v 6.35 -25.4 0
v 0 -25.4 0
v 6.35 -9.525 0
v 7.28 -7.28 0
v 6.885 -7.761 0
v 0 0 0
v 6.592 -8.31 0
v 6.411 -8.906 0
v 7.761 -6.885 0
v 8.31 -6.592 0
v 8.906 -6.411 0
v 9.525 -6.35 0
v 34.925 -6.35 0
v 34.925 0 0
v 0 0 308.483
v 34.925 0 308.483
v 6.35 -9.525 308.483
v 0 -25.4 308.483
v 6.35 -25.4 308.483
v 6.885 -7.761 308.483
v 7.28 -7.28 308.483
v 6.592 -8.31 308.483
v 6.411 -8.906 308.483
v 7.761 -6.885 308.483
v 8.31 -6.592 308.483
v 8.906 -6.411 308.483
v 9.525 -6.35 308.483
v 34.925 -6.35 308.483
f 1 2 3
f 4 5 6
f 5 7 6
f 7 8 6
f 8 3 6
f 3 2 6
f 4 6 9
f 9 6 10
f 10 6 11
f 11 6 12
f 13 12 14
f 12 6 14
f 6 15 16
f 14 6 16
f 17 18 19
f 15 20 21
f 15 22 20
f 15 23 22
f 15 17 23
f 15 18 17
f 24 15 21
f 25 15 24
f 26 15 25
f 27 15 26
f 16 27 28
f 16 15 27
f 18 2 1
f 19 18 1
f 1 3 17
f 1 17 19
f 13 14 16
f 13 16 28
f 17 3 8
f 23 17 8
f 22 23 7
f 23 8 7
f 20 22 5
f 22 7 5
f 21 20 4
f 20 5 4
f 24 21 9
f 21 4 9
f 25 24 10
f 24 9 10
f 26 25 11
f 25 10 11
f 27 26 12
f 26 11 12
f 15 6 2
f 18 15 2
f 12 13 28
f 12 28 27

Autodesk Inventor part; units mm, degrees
ref_plane "YZ Plane" through (0, 0, 0) normal (1, 0, 0) x (0, 1, 0)
ref_plane "XZ Plane" through (0, 0, 0) normal (0, 1, 0) x (-1, 0, 0)
ref_plane "XY Plane" through (0, 0, 0) normal (0, 0, 1) x (1, 0, 0)
sketch "Sketch1" plane through (0, 0, 0) normal (0, 0, 1) x (1, 0, 0)
  line L0 (0, 0) -> (0, -25.4)
  line L1 (0, 0) -> (34.925, 0)
  line L2 (0, -25.4) -> (6.35, -25.4)
  line L3 (34.925, 0) -> (34.925, -6.35)
  line L4 (34.925, -6.35) -> (9.525, -6.35)
  line L5 (6.35, -9.525) -> (6.35, -25.4)
  arc A0 (9.525, -6.35) -> (6.35, -9.525) centre (9.525, -9.525) ccw
  dimension "d0" = 25.4
  dimension "d1" = 34.925
  dimension "d2" = 6.35
  dimension "d3" = 6.35
  dimension "d4" = 3.175
extrude "Extrusion1" add sketch "Sketch1" along normal blind 308.483
equation "\"d2\" = d3"
properties part number "Y_shaft_support_cross_bar" material "Aluminum 6061"
